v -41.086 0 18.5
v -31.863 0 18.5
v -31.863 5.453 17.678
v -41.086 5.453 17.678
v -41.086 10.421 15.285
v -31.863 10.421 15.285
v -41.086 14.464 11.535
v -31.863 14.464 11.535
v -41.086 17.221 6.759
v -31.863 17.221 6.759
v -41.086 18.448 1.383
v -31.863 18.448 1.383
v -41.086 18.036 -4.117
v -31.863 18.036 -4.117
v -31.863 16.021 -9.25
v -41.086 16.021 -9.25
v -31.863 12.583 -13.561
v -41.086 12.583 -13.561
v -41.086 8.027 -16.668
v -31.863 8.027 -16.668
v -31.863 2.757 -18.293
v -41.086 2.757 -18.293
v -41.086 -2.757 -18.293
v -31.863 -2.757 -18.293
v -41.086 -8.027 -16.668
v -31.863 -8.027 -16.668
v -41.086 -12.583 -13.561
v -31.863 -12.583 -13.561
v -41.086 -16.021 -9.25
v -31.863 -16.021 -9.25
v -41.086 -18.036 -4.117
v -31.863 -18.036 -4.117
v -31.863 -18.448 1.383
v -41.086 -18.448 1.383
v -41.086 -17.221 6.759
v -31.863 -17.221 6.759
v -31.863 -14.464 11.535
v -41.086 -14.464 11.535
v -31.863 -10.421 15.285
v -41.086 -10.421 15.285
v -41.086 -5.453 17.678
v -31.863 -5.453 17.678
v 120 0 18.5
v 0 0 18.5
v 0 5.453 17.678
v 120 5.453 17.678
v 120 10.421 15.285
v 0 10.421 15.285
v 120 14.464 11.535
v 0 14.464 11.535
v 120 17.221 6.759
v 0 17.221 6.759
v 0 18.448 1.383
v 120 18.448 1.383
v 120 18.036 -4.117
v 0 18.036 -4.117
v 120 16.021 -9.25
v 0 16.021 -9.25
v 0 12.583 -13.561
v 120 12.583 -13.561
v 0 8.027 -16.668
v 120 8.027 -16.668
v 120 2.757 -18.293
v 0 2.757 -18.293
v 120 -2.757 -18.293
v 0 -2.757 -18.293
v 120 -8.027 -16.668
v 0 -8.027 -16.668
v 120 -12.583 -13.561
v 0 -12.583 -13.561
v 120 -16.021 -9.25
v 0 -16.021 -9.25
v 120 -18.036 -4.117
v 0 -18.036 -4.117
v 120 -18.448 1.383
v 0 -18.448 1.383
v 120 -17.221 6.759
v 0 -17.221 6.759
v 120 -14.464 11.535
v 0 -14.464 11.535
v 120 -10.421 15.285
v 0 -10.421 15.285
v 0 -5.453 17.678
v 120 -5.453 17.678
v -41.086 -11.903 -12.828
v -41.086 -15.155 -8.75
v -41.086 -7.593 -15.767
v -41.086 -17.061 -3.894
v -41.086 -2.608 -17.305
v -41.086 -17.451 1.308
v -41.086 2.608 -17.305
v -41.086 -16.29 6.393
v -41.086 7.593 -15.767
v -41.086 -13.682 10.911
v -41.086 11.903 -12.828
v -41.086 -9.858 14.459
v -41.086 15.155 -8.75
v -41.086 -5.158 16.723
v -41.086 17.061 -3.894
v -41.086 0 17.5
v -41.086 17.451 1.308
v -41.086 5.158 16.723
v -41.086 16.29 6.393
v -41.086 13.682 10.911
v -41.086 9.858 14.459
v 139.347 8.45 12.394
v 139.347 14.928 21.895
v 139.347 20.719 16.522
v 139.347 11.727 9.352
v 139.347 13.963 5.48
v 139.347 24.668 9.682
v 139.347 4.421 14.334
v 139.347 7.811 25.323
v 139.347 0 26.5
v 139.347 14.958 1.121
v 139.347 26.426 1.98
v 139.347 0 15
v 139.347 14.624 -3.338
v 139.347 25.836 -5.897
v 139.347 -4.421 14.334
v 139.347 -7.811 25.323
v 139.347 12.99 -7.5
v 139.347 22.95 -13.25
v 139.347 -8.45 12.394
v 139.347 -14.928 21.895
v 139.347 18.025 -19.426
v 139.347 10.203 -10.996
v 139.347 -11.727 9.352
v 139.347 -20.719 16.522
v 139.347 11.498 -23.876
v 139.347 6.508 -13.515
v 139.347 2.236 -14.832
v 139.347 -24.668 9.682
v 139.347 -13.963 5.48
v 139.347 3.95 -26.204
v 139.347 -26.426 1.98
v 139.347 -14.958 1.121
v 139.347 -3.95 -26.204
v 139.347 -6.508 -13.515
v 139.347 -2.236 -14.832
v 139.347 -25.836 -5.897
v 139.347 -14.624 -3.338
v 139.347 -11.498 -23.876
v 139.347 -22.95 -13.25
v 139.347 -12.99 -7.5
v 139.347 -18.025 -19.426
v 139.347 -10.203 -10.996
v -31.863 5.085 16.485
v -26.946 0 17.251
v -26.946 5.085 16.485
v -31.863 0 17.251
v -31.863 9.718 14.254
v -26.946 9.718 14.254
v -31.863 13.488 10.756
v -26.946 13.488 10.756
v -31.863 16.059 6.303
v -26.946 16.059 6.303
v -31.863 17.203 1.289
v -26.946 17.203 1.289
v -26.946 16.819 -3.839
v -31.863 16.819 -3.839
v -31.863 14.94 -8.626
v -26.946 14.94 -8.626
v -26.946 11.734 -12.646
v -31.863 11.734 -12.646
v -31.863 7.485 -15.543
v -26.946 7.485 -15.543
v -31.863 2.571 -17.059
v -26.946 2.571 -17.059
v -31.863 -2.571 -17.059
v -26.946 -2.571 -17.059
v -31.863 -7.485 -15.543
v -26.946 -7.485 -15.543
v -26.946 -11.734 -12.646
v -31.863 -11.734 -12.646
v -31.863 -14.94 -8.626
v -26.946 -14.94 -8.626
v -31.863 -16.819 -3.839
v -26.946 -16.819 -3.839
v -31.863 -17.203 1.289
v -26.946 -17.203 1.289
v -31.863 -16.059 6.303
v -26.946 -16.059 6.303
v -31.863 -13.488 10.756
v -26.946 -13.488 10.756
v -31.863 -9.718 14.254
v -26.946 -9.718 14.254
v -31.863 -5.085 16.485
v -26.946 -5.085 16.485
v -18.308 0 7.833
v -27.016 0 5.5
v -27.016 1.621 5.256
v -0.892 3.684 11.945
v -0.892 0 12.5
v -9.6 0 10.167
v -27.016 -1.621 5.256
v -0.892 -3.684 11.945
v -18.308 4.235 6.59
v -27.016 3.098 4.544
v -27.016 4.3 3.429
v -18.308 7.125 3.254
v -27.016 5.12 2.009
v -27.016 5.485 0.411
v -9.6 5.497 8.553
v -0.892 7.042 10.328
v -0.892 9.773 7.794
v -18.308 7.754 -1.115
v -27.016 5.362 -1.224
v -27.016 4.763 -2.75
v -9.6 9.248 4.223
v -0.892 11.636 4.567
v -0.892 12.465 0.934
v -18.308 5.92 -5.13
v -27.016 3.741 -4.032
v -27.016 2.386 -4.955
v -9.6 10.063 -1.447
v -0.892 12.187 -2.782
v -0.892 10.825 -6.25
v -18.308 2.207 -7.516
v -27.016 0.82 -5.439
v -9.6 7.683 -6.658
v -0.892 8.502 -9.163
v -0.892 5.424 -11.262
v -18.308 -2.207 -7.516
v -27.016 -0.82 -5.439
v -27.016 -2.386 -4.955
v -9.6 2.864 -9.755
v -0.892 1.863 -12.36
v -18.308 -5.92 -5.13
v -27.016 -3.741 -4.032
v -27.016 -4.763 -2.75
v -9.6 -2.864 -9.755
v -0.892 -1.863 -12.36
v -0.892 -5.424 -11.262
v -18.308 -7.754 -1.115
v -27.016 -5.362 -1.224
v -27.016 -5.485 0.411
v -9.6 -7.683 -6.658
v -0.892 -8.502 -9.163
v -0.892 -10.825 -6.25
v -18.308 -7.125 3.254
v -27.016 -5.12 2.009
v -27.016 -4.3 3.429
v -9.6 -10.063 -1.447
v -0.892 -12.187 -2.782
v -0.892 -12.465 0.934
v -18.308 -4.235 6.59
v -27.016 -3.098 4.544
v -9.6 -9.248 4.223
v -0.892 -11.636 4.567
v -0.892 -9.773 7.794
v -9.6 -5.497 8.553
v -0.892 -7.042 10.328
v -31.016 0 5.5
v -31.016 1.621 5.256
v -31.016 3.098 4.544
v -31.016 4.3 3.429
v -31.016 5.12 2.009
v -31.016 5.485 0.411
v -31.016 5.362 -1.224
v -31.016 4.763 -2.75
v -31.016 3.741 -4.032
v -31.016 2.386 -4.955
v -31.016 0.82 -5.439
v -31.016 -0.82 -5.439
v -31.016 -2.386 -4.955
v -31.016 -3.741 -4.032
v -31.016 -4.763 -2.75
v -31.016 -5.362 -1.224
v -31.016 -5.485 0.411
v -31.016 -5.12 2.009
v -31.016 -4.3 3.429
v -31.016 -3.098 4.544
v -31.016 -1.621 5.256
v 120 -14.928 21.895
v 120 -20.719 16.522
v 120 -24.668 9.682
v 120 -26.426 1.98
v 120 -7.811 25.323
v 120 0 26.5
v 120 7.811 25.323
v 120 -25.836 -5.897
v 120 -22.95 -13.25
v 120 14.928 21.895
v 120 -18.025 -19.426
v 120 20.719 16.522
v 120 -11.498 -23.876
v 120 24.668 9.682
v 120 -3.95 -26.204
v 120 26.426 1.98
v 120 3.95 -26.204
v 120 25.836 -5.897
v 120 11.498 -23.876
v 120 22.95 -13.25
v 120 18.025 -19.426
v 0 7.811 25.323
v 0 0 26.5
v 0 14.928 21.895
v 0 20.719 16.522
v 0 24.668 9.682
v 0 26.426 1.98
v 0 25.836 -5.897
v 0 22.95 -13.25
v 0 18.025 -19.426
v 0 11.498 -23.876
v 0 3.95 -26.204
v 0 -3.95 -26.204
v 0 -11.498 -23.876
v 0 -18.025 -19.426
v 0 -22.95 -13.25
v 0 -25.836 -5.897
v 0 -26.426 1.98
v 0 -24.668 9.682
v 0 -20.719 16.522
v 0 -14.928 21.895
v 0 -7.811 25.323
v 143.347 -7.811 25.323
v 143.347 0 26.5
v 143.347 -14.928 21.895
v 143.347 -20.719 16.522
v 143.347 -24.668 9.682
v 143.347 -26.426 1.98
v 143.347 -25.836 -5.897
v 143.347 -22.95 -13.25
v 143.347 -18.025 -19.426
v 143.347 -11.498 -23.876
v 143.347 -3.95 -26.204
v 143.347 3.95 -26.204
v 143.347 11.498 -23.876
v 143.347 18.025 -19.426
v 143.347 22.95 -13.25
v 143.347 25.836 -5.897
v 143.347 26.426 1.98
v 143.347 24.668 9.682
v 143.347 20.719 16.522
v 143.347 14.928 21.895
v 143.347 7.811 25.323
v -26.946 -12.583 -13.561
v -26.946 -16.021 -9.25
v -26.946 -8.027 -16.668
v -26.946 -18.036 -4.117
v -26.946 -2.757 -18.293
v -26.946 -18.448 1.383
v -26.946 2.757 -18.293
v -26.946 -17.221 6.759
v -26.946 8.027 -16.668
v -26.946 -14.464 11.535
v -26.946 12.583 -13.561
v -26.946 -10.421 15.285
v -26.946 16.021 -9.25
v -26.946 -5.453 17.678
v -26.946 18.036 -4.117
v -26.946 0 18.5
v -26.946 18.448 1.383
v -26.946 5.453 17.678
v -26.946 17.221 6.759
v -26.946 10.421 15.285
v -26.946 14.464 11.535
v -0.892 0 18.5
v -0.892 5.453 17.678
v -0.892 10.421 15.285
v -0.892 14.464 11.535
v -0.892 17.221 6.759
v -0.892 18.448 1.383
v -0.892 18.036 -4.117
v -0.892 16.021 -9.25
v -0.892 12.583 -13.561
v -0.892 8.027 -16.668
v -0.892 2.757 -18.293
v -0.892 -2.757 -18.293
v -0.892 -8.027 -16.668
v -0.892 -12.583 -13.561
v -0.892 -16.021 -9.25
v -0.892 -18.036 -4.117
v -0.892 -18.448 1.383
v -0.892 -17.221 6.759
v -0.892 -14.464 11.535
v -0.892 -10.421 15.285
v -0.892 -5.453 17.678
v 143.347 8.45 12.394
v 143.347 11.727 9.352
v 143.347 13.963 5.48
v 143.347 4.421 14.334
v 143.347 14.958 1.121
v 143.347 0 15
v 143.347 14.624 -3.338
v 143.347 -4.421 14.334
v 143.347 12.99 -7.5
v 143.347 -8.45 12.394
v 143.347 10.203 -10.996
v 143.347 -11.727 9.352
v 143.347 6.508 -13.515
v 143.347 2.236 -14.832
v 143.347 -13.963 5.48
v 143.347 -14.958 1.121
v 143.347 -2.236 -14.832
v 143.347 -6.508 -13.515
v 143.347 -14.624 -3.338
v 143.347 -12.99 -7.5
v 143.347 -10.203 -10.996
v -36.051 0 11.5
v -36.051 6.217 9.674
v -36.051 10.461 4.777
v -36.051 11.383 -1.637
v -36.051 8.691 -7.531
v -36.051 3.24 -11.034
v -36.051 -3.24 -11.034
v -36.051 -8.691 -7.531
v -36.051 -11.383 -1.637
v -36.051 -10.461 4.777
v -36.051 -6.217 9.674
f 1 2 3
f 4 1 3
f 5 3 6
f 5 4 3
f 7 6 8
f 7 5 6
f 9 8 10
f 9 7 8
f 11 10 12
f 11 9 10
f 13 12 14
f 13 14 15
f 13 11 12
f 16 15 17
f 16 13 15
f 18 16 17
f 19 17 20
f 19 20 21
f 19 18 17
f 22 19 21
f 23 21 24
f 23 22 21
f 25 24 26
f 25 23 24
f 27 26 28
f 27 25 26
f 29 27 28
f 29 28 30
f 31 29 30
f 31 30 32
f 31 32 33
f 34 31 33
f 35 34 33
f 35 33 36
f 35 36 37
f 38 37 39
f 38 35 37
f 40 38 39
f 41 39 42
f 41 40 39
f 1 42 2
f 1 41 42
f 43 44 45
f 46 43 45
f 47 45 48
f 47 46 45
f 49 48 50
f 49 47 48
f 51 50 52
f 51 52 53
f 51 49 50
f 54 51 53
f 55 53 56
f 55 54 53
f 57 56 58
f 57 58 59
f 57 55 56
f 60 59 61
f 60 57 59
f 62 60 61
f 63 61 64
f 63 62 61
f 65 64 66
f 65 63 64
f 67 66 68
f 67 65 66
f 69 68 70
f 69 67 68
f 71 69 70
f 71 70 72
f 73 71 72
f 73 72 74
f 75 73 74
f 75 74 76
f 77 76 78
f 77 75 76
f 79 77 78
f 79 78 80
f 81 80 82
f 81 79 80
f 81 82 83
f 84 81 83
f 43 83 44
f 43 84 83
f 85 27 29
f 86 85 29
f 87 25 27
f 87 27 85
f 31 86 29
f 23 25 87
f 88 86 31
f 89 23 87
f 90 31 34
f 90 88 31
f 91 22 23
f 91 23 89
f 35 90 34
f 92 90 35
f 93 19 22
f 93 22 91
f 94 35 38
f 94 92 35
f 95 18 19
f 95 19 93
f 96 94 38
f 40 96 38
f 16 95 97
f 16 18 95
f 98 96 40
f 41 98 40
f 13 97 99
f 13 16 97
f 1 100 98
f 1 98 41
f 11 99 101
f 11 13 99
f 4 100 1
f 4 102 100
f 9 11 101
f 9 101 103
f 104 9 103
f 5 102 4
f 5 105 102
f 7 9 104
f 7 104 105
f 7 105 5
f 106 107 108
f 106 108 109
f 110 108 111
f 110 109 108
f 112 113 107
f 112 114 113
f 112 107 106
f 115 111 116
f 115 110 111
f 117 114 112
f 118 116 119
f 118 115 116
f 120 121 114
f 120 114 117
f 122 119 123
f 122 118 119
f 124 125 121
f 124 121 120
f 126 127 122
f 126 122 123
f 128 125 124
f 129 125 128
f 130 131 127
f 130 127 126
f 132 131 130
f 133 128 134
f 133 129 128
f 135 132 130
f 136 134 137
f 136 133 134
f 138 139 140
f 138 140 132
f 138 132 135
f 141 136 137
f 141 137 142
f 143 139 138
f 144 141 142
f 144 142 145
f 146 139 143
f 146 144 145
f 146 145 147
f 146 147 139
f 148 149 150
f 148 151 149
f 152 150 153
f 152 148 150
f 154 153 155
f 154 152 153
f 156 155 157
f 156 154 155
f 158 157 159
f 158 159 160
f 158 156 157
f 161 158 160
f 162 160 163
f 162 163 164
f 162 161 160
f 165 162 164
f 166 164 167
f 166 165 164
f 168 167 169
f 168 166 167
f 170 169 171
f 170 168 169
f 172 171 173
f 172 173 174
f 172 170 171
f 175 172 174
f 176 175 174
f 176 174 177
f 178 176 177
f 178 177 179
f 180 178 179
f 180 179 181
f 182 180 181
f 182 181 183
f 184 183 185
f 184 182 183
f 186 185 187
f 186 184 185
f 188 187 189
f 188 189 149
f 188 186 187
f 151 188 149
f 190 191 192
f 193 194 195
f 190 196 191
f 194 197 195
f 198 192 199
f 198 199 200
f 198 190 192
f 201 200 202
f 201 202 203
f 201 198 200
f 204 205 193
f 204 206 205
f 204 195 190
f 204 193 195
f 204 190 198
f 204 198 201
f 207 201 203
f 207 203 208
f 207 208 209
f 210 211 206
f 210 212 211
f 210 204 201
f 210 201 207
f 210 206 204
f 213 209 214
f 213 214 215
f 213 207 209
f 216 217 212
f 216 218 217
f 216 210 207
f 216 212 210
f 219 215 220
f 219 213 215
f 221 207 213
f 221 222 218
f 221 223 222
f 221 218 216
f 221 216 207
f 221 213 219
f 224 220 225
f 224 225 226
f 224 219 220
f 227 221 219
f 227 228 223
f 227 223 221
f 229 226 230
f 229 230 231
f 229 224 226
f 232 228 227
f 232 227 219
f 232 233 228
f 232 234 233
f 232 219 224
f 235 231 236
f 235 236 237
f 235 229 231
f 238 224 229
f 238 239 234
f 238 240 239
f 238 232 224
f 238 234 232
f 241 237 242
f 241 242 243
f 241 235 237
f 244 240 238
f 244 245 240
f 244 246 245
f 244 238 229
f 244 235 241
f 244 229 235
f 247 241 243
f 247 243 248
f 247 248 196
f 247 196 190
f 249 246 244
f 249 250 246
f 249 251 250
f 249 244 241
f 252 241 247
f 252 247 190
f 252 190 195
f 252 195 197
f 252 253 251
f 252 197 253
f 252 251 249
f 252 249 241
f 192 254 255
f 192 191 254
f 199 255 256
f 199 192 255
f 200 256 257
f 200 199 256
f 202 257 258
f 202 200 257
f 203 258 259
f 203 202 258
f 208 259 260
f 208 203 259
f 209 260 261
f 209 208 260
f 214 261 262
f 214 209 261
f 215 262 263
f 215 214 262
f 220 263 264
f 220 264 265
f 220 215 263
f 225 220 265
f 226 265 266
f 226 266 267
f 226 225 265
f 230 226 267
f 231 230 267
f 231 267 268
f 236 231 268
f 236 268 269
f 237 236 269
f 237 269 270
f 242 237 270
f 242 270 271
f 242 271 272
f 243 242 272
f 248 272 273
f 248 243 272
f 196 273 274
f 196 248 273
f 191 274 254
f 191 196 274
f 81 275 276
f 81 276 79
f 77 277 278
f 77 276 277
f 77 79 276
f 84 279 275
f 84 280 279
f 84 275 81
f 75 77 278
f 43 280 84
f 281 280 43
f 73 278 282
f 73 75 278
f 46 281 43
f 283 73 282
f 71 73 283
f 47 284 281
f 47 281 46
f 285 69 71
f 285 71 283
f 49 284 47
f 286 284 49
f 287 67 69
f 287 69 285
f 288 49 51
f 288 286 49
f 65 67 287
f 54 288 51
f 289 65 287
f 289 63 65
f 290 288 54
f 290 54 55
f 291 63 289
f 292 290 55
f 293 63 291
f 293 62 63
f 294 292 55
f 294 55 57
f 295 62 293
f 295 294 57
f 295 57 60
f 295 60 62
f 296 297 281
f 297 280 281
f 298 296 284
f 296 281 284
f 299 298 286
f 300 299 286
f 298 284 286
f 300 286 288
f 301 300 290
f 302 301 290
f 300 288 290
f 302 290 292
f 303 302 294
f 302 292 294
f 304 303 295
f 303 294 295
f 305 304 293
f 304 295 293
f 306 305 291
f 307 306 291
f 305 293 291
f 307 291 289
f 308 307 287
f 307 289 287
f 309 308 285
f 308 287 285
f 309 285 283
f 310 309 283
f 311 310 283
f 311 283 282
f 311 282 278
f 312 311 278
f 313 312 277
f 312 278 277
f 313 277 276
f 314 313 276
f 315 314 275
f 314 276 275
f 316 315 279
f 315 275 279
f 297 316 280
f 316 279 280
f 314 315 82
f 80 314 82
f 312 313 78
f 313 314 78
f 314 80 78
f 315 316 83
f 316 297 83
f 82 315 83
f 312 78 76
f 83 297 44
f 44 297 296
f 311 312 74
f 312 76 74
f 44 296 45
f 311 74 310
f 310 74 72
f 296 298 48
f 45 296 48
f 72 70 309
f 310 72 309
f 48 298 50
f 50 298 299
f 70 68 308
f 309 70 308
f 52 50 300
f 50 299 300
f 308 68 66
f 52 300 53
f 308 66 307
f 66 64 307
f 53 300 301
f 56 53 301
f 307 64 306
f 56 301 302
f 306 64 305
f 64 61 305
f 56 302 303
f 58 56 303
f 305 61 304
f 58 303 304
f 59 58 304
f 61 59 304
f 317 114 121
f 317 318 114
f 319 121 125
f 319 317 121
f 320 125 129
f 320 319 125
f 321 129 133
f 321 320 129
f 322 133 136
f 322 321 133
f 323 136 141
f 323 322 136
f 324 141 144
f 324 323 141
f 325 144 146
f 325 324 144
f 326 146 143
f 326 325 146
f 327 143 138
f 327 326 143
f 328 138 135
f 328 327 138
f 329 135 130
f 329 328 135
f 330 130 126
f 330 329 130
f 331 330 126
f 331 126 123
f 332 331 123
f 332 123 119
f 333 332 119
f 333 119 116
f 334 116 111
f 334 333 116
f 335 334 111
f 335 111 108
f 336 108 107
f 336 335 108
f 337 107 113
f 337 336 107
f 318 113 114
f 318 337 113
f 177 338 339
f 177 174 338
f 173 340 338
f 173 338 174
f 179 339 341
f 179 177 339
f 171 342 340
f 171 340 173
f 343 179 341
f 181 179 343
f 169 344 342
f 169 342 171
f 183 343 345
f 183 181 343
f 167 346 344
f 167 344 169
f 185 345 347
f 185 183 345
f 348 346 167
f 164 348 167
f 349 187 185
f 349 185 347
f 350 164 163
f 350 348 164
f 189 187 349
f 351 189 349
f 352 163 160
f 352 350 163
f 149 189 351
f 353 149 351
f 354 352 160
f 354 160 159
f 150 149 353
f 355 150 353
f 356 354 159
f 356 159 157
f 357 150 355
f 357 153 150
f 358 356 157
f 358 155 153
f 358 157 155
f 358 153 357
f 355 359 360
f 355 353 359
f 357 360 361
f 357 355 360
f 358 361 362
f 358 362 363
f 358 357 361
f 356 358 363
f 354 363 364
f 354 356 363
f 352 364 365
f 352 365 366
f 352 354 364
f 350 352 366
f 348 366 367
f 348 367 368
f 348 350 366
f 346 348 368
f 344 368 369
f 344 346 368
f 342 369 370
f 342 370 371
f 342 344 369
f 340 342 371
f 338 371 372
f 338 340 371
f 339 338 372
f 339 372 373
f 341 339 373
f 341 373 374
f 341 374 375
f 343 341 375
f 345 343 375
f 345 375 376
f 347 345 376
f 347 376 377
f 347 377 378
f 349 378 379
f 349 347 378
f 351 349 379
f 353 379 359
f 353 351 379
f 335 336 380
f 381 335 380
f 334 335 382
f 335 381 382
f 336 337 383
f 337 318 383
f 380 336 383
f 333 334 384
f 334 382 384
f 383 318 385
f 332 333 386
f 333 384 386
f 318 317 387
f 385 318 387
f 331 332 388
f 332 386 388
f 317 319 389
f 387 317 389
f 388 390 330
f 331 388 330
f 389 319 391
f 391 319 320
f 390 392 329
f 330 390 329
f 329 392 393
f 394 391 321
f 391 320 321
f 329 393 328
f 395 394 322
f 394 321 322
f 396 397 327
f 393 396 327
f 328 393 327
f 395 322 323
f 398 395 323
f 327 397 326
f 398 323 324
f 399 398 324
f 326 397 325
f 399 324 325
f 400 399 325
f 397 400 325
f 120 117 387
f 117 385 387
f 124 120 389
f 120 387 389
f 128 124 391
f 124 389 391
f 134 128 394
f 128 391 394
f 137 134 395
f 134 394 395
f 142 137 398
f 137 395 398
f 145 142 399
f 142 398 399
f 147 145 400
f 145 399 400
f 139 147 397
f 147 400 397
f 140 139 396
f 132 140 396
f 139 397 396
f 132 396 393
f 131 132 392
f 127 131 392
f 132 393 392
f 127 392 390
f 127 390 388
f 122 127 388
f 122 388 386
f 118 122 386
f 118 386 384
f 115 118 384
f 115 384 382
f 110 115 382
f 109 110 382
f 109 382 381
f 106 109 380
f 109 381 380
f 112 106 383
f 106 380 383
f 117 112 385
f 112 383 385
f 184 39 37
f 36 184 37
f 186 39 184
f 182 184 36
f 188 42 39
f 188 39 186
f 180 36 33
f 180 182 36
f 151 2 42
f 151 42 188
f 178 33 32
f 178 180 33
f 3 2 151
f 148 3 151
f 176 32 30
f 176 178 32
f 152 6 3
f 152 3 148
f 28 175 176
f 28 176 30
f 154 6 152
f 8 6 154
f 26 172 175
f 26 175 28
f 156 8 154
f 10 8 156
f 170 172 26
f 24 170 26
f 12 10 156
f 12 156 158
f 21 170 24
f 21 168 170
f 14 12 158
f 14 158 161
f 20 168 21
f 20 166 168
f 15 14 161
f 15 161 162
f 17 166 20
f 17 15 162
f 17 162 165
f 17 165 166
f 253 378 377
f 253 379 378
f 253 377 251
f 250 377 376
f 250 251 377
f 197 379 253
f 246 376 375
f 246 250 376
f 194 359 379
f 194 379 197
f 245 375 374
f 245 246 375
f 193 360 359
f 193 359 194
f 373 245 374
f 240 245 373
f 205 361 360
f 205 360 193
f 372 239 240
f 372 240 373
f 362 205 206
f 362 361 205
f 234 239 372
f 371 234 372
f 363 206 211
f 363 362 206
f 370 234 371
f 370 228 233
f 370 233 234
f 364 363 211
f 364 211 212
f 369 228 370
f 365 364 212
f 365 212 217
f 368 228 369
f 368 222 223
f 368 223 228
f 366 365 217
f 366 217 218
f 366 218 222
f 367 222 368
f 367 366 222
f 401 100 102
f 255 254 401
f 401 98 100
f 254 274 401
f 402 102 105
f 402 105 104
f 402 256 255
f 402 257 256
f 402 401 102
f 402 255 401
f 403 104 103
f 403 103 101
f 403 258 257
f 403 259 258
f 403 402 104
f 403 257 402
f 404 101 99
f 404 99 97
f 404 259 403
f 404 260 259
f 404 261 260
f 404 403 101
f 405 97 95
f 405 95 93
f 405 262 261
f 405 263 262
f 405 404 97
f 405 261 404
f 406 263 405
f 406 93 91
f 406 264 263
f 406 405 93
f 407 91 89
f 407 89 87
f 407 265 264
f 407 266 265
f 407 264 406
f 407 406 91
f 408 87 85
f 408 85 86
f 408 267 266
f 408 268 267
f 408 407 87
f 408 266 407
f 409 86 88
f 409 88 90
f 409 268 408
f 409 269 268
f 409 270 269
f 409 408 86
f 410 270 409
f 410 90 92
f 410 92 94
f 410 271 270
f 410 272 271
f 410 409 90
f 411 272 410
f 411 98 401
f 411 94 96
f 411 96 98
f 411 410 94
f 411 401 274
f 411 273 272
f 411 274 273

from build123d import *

# Parameters (mm, degrees)
F0_W = 120
F0_H = 8
F4_W = 4
F4_H = 11.5


with BuildPart() as f1:
    # F0 (on Front) → F1 (revolve)
    with BuildSketch(Plane.XZ):
        with Locations((60, 22.5)):
            Rectangle(F0_W, F0_H)
    revolve(axis=Axis((70.710246, 0, 0), (-1, 0, 0)))


with BuildPart() as f3:
    # F2 (on Front) → F3 (revolve)
    with BuildSketch(Plane.XZ):
        Polygon((-31.863008, 18.5), (-41.085526, 18.5), (-41.085526, 17.5), (-31.01633, 5.5), (-27.01633, 5.5), (-0.891974, 12.5), (-0.891974, 18.5), (-26.945636, 18.5), (-26.945636, 17.251454), (-31.863008, 17.251454), align=None)
    revolve(axis=Axis((-18.90575, 0, 0), (-1, 0, 0)))


with BuildPart() as f5:
    # F4 (on Front) → F5 (revolve)
    with BuildSketch(Plane.XZ):
        with Locations((141.347285, 20.75)):
            Rectangle(F4_W, F4_H)
    revolve(axis=Axis((106.369392, 0, 0), (1, 0, 0)))


solid = Compound([f1.part, f3.part, f5.part])
